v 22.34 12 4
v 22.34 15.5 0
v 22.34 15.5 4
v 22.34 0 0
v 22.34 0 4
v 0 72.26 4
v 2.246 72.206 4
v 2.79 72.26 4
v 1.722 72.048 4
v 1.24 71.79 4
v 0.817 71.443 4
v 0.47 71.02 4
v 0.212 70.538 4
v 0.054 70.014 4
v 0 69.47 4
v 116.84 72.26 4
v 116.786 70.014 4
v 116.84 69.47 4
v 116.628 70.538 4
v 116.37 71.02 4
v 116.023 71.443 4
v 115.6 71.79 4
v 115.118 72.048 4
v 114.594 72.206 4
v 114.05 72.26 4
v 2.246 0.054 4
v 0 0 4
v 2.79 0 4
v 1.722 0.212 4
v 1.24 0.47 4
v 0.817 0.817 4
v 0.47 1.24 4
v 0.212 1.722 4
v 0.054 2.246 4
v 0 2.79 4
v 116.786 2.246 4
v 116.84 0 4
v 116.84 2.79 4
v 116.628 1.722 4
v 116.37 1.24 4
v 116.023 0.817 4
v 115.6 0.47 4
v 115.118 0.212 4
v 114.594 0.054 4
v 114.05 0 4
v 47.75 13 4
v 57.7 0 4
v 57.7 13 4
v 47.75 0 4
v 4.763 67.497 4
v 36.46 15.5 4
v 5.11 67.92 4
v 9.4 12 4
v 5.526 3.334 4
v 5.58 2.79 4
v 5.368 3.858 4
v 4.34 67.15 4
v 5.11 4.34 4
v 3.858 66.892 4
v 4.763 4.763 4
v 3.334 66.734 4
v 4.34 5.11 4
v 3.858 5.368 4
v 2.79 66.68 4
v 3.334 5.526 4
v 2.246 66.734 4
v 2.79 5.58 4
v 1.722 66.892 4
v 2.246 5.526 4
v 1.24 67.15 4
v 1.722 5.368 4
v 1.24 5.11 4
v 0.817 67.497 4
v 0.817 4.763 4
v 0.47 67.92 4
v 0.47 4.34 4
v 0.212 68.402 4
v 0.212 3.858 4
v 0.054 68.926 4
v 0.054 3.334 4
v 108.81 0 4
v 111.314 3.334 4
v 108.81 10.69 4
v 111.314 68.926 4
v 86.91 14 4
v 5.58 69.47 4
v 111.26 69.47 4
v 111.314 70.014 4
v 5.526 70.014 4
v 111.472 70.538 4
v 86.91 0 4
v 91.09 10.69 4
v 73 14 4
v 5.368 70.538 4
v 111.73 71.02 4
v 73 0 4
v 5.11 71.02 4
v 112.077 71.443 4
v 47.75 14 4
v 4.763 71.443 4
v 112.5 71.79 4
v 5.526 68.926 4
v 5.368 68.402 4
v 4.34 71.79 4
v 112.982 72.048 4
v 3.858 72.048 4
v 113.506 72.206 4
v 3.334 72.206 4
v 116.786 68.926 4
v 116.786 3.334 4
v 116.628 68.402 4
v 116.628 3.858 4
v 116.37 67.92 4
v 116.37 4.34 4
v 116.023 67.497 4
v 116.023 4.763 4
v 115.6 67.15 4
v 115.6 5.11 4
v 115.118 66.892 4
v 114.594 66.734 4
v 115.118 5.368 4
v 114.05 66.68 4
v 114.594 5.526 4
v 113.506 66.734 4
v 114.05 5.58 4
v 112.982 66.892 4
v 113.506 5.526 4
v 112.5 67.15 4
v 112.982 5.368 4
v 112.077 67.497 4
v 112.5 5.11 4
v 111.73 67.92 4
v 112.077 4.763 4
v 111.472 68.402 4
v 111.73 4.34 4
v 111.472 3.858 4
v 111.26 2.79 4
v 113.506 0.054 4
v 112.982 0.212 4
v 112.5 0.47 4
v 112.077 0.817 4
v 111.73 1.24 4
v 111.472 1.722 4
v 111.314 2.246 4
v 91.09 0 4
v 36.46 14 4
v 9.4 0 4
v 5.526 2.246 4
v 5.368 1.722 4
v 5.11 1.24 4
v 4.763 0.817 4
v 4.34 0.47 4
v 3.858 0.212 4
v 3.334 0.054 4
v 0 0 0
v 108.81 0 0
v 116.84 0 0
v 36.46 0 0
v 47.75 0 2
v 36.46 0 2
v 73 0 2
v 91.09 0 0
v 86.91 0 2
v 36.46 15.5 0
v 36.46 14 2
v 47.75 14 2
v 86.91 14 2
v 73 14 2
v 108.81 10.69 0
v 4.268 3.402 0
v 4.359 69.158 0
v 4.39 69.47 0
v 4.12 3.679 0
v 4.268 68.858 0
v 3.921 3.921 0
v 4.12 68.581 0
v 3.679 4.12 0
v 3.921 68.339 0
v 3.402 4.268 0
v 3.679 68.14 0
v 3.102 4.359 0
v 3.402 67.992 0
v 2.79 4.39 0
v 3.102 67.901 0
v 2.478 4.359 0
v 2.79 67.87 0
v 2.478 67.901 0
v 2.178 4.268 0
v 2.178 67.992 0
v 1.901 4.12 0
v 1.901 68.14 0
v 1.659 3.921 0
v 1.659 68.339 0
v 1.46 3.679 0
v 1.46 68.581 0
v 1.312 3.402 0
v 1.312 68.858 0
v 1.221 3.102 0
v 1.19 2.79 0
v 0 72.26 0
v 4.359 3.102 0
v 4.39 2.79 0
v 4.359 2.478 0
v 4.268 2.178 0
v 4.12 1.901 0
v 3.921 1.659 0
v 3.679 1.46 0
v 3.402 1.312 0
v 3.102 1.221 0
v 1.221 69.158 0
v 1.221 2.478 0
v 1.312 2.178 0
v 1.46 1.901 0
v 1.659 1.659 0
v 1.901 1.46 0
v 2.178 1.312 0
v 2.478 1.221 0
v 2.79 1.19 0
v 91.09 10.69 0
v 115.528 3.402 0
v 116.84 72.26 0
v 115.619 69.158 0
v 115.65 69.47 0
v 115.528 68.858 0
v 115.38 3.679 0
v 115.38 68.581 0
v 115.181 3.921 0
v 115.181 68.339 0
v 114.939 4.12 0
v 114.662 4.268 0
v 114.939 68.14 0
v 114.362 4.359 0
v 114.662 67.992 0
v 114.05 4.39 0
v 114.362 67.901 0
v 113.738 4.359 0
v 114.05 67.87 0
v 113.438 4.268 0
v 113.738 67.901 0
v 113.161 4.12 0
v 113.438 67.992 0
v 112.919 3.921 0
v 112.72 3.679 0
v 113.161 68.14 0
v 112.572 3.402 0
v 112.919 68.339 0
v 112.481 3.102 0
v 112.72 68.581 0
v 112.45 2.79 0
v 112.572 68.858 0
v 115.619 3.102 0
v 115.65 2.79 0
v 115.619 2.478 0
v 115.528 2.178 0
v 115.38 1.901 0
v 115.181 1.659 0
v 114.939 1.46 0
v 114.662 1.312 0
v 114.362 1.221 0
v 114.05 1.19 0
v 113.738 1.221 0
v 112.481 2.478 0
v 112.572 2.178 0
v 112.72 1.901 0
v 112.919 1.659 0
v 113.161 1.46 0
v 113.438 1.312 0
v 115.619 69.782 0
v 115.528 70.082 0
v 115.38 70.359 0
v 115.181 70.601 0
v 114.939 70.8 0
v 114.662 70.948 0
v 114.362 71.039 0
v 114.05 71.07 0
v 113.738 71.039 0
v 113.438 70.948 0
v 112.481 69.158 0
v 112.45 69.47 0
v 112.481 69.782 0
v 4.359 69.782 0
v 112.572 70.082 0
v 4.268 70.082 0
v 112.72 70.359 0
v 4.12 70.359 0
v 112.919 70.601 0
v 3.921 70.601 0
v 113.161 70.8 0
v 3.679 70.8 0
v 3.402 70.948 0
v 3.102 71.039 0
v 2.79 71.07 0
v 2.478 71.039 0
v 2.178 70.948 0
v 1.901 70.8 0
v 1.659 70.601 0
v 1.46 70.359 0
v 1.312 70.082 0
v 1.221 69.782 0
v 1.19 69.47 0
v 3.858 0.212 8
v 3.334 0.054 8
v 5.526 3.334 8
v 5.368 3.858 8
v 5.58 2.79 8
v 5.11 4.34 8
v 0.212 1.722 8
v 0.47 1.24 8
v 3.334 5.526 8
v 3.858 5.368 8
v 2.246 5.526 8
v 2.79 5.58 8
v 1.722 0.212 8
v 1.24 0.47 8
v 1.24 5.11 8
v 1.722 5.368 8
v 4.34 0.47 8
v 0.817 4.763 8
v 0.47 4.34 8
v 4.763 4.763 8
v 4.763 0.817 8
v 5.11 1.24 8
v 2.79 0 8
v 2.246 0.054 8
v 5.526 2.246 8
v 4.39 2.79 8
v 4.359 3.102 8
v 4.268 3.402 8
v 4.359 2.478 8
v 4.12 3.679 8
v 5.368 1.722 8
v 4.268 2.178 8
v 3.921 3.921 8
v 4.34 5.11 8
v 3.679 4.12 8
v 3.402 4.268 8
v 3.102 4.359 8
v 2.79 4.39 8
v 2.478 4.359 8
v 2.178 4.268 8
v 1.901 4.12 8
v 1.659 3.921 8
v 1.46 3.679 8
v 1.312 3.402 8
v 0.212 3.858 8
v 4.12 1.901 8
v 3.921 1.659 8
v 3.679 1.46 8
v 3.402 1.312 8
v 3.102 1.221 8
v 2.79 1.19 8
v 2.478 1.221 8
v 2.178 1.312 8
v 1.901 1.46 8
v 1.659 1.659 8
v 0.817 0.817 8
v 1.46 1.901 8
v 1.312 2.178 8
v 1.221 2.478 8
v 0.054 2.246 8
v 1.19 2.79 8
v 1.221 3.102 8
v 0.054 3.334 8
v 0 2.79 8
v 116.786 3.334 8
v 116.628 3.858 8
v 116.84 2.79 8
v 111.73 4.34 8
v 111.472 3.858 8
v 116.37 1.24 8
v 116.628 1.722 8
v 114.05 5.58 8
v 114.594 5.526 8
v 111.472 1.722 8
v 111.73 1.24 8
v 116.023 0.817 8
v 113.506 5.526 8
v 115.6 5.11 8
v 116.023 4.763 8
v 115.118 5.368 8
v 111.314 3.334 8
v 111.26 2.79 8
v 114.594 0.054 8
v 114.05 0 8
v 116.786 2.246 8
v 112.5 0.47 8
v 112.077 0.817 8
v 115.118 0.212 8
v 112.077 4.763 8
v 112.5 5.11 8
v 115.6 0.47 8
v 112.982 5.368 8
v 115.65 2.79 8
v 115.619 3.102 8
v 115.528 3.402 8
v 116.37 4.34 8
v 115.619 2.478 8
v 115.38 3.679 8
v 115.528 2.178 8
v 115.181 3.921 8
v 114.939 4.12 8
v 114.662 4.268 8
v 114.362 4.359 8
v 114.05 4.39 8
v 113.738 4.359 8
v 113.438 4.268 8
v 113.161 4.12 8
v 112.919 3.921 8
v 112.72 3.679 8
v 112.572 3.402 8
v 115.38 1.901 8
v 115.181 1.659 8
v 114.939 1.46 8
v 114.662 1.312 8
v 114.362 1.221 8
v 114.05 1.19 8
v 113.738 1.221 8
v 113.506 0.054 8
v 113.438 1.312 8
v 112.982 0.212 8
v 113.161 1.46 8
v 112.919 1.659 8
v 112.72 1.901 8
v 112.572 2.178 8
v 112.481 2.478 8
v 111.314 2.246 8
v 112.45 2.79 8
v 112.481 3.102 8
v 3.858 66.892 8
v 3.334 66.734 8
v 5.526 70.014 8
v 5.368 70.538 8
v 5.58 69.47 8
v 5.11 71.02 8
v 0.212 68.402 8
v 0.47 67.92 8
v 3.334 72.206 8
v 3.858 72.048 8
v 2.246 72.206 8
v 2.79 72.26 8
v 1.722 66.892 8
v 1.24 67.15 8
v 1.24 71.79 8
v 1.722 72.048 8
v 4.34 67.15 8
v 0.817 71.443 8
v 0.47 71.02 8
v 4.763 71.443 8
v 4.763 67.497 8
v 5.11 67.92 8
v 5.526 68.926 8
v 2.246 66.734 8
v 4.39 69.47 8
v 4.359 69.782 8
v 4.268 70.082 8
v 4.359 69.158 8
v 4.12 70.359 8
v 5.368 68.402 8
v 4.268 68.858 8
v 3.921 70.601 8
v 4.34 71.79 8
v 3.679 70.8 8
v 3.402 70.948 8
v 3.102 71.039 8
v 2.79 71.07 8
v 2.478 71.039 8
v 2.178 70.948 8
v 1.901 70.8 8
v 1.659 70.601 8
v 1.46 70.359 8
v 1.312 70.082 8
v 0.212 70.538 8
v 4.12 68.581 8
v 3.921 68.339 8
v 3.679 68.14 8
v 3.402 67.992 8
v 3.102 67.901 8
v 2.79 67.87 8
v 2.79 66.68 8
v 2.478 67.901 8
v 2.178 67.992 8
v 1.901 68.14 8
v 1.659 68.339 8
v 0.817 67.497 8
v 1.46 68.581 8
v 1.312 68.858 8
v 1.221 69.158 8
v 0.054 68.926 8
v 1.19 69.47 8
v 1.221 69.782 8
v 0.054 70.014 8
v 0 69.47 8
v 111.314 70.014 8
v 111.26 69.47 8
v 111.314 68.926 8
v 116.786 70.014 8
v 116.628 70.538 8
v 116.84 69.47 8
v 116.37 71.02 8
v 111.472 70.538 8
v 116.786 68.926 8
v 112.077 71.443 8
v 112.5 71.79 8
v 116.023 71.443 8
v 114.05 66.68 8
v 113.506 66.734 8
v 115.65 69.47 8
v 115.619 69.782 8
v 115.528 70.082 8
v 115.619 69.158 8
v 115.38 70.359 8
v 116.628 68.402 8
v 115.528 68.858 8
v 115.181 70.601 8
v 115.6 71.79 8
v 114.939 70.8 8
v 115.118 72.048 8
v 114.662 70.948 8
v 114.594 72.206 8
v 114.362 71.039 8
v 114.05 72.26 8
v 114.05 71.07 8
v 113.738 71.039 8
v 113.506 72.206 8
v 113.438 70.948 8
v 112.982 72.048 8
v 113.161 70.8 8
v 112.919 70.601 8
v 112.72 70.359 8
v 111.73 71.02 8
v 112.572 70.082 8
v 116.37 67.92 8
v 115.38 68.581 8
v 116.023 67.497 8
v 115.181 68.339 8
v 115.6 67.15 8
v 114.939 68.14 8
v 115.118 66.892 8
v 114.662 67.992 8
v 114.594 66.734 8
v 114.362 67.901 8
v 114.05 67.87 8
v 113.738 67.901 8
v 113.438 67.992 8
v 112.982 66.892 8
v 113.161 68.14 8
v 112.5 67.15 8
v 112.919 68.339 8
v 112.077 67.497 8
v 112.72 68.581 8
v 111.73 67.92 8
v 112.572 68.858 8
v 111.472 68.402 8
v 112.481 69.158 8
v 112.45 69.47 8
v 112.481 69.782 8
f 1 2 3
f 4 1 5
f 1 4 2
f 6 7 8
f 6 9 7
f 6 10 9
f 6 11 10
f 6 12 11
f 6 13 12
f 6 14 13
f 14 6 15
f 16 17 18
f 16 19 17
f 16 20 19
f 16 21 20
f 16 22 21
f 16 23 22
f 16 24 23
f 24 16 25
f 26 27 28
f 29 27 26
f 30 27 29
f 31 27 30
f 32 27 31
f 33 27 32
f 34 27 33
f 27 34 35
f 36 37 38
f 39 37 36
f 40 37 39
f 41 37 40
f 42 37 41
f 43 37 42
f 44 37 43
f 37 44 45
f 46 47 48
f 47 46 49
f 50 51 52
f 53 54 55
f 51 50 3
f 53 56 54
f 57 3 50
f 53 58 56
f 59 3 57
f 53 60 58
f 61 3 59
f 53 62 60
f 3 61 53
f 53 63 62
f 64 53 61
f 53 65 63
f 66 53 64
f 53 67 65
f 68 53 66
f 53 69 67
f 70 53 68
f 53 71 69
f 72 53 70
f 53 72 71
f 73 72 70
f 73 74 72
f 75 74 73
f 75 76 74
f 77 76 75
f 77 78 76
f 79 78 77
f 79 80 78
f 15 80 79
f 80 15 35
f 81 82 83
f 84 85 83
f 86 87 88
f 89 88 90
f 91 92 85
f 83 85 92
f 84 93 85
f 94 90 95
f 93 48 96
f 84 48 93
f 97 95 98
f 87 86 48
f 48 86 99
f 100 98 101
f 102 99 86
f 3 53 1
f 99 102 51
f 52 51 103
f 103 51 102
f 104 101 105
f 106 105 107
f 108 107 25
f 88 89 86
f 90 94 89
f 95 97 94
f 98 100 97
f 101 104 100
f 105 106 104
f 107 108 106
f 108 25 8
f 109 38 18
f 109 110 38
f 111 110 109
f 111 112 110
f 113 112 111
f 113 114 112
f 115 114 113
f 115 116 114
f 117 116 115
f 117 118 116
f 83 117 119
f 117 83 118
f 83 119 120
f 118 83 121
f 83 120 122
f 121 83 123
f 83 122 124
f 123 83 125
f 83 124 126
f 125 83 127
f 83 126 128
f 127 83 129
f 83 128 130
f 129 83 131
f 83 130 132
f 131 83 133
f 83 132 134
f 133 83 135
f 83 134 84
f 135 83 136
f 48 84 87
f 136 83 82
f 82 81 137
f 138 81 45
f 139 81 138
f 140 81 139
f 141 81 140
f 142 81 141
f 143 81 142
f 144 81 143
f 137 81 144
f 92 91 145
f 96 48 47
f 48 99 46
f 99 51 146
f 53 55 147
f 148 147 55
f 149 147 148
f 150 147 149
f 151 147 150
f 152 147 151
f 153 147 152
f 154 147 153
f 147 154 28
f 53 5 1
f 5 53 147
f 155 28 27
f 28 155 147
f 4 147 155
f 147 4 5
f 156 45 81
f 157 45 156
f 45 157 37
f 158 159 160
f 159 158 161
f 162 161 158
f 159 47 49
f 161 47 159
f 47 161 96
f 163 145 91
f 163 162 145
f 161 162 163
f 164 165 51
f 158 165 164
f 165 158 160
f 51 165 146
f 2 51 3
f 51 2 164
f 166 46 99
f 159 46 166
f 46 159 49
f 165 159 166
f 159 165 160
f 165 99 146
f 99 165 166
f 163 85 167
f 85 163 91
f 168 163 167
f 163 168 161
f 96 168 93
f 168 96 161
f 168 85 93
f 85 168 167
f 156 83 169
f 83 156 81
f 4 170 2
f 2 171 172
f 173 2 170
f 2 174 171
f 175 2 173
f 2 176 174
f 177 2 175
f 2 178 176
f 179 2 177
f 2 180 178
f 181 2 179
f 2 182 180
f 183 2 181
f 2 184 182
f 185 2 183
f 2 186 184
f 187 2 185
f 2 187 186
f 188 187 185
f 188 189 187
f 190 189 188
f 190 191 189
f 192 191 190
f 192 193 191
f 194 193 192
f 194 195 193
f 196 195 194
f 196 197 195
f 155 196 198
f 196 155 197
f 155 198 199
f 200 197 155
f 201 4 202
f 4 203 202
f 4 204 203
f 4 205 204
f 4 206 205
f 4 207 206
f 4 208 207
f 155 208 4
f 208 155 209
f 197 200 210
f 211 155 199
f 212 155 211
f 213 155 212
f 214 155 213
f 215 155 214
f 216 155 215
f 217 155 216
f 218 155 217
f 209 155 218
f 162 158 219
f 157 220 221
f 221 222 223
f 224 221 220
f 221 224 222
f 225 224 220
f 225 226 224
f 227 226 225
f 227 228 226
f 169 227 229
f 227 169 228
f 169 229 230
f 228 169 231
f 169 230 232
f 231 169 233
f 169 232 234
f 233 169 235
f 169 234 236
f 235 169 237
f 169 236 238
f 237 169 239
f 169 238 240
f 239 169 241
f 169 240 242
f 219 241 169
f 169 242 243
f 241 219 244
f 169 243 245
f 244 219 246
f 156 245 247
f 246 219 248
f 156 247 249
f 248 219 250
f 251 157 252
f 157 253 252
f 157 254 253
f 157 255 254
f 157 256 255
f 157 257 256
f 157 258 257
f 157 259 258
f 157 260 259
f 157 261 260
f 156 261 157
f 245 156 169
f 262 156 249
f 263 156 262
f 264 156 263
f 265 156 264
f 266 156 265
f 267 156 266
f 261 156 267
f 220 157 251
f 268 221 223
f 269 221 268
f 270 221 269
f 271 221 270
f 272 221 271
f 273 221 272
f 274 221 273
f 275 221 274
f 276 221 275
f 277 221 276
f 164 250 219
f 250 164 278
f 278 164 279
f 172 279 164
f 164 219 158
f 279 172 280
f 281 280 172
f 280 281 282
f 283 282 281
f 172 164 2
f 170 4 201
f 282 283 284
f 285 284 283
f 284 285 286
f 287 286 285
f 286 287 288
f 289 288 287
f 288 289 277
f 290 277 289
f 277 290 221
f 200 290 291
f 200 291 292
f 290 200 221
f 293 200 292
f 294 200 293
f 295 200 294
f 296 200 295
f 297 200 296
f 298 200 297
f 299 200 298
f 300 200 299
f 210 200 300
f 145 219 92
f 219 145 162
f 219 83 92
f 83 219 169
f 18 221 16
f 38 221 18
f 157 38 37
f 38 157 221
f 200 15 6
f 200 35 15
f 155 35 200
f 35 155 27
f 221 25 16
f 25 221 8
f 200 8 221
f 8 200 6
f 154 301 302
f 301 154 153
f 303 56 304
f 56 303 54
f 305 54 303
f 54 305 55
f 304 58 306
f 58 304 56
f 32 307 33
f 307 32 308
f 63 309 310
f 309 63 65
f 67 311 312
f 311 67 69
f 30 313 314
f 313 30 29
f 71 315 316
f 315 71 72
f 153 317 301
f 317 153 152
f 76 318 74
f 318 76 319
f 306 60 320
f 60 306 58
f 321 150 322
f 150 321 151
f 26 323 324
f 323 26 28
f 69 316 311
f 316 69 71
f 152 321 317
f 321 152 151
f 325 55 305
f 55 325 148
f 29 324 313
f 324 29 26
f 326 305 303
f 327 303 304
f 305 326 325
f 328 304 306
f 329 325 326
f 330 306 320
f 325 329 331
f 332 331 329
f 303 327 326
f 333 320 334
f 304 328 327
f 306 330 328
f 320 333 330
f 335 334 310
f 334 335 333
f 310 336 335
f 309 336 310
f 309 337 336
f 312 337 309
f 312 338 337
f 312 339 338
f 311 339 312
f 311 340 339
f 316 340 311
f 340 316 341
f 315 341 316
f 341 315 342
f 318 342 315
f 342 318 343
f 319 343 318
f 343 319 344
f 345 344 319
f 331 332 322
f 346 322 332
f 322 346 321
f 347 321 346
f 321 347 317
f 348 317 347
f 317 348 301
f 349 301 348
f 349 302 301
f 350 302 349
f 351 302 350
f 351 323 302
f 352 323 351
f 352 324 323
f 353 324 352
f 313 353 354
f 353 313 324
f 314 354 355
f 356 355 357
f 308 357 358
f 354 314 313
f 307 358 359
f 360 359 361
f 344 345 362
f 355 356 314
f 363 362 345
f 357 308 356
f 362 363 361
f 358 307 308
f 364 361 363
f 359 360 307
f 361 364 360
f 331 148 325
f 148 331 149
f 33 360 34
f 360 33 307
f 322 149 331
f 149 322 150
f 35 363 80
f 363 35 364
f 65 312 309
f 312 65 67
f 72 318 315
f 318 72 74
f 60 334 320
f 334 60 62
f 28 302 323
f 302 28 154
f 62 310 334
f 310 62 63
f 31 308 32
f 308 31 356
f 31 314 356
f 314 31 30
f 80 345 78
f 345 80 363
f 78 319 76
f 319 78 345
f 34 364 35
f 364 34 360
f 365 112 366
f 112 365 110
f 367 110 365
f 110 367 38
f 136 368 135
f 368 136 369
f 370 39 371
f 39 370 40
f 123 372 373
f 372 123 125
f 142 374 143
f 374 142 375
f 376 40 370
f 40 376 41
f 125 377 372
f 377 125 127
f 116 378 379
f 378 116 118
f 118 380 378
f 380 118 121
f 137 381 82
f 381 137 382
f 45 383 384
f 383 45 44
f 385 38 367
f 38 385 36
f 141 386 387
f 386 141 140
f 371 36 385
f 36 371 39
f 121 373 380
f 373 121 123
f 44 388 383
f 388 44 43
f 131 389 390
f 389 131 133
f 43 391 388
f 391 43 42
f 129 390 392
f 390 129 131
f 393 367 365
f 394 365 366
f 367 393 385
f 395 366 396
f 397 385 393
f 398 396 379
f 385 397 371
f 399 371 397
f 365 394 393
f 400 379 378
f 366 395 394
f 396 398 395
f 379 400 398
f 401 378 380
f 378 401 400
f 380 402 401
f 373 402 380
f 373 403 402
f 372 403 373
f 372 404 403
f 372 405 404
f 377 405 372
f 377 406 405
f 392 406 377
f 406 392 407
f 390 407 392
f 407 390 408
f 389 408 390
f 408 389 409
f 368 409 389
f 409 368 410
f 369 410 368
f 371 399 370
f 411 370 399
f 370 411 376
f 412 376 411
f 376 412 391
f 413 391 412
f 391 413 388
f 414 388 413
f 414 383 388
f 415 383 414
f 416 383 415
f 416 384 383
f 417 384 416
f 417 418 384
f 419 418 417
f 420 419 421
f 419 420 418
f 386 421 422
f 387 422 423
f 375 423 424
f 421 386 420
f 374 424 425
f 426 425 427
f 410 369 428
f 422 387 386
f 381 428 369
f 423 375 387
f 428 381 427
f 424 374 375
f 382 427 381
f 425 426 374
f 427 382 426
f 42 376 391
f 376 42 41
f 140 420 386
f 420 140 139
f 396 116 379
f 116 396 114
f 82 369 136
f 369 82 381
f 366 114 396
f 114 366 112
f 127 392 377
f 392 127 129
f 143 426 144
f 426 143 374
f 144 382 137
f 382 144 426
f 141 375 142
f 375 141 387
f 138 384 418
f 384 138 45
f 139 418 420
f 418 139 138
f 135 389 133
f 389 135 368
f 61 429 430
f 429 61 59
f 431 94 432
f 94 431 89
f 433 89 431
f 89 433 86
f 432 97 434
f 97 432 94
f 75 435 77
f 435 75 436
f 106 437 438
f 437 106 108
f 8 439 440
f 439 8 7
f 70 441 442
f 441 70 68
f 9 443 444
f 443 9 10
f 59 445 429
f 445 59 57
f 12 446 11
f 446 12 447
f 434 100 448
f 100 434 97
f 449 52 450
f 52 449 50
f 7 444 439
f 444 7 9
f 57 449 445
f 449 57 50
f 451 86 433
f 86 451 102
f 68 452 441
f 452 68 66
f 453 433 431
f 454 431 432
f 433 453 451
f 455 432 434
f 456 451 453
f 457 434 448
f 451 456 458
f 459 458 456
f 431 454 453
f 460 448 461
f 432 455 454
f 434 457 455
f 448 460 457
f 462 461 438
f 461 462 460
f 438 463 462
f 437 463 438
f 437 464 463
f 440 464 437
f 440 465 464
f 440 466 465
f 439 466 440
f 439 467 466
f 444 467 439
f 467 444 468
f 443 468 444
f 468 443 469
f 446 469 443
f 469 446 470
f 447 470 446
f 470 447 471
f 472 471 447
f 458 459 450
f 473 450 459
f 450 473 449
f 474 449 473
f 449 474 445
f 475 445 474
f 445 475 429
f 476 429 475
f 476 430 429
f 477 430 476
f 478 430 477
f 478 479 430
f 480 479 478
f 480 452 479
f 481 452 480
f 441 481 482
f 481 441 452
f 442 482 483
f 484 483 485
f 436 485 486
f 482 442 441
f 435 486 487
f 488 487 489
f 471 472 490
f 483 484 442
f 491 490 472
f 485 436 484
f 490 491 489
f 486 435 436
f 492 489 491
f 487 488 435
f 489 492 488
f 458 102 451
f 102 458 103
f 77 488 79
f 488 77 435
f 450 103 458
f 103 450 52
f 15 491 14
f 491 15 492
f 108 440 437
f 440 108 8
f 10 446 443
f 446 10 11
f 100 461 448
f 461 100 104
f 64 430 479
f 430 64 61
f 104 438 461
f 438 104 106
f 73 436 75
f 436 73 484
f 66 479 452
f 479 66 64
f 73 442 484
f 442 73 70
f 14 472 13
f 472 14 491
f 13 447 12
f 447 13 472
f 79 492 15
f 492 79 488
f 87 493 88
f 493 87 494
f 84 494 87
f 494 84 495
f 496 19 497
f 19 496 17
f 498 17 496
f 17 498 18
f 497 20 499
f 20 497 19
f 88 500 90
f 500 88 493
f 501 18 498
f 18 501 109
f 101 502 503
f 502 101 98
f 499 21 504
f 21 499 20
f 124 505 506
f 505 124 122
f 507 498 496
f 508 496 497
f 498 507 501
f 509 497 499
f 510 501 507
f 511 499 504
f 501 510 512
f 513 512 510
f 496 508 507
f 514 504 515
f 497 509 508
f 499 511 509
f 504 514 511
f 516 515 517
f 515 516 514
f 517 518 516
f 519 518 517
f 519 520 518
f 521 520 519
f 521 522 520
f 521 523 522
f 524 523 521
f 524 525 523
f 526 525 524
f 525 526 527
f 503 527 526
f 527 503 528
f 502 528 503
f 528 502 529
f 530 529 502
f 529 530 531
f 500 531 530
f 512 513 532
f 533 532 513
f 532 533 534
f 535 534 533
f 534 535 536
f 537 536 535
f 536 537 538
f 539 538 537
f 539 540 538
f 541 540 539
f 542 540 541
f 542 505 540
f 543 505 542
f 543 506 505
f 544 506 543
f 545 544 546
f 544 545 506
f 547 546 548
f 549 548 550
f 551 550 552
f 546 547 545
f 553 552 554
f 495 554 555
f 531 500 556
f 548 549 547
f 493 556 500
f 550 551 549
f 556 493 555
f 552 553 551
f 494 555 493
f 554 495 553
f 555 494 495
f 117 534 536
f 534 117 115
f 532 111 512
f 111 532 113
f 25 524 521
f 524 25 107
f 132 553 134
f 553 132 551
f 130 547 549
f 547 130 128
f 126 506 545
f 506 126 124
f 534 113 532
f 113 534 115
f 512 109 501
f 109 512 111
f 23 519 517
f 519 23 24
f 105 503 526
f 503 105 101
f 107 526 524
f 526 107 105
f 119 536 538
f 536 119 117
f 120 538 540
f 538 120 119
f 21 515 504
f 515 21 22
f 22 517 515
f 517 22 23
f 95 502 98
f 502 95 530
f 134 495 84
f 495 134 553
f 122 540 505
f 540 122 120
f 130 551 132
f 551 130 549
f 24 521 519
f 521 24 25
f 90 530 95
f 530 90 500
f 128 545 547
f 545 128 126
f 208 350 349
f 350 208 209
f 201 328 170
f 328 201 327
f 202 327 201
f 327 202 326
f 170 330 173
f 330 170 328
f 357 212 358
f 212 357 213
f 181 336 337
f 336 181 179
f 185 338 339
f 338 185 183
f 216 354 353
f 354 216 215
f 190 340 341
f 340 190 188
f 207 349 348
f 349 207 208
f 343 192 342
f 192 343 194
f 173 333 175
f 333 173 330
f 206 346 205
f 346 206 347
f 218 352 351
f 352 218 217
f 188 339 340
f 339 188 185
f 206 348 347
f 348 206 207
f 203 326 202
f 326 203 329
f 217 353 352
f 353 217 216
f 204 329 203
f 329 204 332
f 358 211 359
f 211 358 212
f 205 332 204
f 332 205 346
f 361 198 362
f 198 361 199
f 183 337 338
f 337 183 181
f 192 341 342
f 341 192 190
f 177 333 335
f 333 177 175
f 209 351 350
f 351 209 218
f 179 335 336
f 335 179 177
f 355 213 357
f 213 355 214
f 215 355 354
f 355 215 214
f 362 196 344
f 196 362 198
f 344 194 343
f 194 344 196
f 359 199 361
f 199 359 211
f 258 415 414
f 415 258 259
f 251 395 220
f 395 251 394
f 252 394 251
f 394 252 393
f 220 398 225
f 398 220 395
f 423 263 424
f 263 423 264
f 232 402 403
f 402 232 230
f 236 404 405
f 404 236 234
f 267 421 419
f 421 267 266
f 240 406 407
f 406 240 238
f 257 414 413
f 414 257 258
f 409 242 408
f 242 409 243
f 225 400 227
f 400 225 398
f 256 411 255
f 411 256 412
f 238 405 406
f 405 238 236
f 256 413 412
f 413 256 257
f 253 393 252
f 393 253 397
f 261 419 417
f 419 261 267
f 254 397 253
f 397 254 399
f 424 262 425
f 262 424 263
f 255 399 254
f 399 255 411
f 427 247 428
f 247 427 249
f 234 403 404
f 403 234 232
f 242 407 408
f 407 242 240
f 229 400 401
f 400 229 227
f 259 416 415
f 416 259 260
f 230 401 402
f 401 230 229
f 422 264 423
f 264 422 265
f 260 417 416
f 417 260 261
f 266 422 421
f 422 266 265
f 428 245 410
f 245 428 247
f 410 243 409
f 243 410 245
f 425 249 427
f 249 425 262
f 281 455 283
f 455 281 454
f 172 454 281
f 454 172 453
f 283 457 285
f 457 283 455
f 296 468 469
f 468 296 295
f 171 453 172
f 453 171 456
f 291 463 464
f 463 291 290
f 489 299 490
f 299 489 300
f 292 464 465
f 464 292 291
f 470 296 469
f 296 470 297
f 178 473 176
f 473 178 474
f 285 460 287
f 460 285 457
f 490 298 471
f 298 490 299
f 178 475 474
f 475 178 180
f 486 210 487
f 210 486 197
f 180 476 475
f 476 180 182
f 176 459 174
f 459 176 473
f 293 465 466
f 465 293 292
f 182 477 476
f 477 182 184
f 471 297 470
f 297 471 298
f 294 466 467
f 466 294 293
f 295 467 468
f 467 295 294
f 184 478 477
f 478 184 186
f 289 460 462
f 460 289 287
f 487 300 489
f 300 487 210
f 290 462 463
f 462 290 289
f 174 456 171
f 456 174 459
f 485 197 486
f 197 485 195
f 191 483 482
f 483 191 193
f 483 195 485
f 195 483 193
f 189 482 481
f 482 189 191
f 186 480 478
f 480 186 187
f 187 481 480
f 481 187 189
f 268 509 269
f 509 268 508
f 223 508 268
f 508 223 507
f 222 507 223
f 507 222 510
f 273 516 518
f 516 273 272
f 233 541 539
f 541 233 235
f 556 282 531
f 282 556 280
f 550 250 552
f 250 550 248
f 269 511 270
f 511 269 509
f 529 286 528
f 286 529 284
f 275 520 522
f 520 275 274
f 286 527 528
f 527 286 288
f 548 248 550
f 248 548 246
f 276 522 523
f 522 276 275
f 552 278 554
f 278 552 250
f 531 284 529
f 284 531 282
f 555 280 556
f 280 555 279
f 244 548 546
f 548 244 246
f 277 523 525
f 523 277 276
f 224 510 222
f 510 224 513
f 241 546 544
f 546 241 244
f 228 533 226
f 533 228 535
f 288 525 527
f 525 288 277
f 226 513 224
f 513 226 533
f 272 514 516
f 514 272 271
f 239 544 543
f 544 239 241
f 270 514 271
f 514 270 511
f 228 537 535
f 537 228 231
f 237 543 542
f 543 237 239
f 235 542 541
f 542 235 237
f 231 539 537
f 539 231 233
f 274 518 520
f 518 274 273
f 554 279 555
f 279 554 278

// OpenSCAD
$fn = 32;

width = 116.84;
height = 72.26;
thickness = 4;

// distance from the edge of the device's PCB to the centre of the mounting hole.
screw_inset = 2.79;
stem_radius = 2.79;
stem_depth = 4;
total_depth = stem_depth + thickness;
hole_radius = 1.6;



module stem() {
	cylinder(total_depth, stem_radius, stem_radius);
}



// the four locations of the stems inset from the edges.
x1 = screw_inset;
x2 = width - screw_inset;

y1 = screw_inset;
y2 = height - screw_inset;

c1 = [ x1, y1, 0 ];
c2 = [ x2, y1, 0 ];
c3 = [ x1, y2, 0 ];
c4 = [ x2, y2, 0 ];



module hole() {
	cylinder(total_depth, hole_radius, hole_radius);
}





// height zones listed in the schematic for surface mounted components.
// the Y (in this model) distances were measured on-device.
// the X and Z depths were taken from their schematic.

// zone widths layed out left-to-right, cumulative according to schematic.
zone_blank1	=  9.40;
zone_usb	= 12.94;
zone_dcjack	= 14.12;
zone_auxpower	= 11.29;
zone_backlight	=  9.95;
zone_blank2	= 15.30;
zone_bigcoil	= 13.91;
zone_blank3	=  4.18;
zone_hdmi	= 17.72;
zone_blank4	=  8.03;

// cumulative X as we go along the components left-to-right.
// XXX: how good is openscad's looping? might be easier to run through an array...
xz_usb	= zone_blank1;
xz_dcjack	=	xz_usb		+ zone_usb;
xz_auxpower	=	xz_dcjack	+ zone_dcjack;
xz_backlight	=	xz_auxpower	+ zone_auxpower;
xz_bigcoil	=	xz_backlight	+ zone_backlight	+ zone_blank2;
xz_hdmi	=	xz_bigcoil	+ zone_bigcoil		+ zone_blank3;

// assert the numbers line up with the edge of the board to check consistency with schematic.
xz_total	=	xz_hdmi	+ zone_hdmi	+ zone_blank4;
assert((xz_total == width), "cumulative height zone width mismatch");

module components() {
	// first put a base safety layer down for all other components.
	// the schematic states all other components are <2mm.
	// some of these components go right up to the edge of the board,
	// so with the exception of the mounting hole keep-out zones,
	// so must said safety layer without more precise measurements.
	cube([width, height, 2]);

	// reference everything "backwards" from the top edge...
	translate([0, height, 0]) {
		// XXX: assuming Y measurements based on device instead of schematic allowances...
		// naturally some safety margins are included.
		// GRRR why can't I use negative dimensions to work "backwards" here...
		translate([xz_usb,-12,0]) cube([zone_usb,12,4]);

		// this one's Y dim *was* given in the schematic.
		translate([xz_dcjack,-15.5,0]) cube([zone_dcjack,15.5,12]);

		translate([xz_auxpower,-14,0]) cube([zone_auxpower,14,6]);
		translate([xz_backlight,-13,0]) cube([zone_backlight,13,4]);
		translate([xz_bigcoil,-14,0]) cube([zone_bigcoil,14,6]);

		// again this one's Y was given in schematic
		translate([xz_hdmi,-10.69,0]) cube([zone_hdmi,10.69,8]);
	}
}



module base() {
	difference() {
		cube([width, height, thickness]);
		translate([0,height,total_depth]) rotate([180,0,0]) components();
	}
	translate(c1) stem();
	translate(c2) stem();
	translate(c3) stem();
	translate(c4) stem();
}




difference() {
	base();
	translate(c1) hole();
	translate(c2) hole();
	translate(c3) hole();
	translate(c4) hole();
}


//translate([0,height,50]) rotate([180,0,0]) components();
